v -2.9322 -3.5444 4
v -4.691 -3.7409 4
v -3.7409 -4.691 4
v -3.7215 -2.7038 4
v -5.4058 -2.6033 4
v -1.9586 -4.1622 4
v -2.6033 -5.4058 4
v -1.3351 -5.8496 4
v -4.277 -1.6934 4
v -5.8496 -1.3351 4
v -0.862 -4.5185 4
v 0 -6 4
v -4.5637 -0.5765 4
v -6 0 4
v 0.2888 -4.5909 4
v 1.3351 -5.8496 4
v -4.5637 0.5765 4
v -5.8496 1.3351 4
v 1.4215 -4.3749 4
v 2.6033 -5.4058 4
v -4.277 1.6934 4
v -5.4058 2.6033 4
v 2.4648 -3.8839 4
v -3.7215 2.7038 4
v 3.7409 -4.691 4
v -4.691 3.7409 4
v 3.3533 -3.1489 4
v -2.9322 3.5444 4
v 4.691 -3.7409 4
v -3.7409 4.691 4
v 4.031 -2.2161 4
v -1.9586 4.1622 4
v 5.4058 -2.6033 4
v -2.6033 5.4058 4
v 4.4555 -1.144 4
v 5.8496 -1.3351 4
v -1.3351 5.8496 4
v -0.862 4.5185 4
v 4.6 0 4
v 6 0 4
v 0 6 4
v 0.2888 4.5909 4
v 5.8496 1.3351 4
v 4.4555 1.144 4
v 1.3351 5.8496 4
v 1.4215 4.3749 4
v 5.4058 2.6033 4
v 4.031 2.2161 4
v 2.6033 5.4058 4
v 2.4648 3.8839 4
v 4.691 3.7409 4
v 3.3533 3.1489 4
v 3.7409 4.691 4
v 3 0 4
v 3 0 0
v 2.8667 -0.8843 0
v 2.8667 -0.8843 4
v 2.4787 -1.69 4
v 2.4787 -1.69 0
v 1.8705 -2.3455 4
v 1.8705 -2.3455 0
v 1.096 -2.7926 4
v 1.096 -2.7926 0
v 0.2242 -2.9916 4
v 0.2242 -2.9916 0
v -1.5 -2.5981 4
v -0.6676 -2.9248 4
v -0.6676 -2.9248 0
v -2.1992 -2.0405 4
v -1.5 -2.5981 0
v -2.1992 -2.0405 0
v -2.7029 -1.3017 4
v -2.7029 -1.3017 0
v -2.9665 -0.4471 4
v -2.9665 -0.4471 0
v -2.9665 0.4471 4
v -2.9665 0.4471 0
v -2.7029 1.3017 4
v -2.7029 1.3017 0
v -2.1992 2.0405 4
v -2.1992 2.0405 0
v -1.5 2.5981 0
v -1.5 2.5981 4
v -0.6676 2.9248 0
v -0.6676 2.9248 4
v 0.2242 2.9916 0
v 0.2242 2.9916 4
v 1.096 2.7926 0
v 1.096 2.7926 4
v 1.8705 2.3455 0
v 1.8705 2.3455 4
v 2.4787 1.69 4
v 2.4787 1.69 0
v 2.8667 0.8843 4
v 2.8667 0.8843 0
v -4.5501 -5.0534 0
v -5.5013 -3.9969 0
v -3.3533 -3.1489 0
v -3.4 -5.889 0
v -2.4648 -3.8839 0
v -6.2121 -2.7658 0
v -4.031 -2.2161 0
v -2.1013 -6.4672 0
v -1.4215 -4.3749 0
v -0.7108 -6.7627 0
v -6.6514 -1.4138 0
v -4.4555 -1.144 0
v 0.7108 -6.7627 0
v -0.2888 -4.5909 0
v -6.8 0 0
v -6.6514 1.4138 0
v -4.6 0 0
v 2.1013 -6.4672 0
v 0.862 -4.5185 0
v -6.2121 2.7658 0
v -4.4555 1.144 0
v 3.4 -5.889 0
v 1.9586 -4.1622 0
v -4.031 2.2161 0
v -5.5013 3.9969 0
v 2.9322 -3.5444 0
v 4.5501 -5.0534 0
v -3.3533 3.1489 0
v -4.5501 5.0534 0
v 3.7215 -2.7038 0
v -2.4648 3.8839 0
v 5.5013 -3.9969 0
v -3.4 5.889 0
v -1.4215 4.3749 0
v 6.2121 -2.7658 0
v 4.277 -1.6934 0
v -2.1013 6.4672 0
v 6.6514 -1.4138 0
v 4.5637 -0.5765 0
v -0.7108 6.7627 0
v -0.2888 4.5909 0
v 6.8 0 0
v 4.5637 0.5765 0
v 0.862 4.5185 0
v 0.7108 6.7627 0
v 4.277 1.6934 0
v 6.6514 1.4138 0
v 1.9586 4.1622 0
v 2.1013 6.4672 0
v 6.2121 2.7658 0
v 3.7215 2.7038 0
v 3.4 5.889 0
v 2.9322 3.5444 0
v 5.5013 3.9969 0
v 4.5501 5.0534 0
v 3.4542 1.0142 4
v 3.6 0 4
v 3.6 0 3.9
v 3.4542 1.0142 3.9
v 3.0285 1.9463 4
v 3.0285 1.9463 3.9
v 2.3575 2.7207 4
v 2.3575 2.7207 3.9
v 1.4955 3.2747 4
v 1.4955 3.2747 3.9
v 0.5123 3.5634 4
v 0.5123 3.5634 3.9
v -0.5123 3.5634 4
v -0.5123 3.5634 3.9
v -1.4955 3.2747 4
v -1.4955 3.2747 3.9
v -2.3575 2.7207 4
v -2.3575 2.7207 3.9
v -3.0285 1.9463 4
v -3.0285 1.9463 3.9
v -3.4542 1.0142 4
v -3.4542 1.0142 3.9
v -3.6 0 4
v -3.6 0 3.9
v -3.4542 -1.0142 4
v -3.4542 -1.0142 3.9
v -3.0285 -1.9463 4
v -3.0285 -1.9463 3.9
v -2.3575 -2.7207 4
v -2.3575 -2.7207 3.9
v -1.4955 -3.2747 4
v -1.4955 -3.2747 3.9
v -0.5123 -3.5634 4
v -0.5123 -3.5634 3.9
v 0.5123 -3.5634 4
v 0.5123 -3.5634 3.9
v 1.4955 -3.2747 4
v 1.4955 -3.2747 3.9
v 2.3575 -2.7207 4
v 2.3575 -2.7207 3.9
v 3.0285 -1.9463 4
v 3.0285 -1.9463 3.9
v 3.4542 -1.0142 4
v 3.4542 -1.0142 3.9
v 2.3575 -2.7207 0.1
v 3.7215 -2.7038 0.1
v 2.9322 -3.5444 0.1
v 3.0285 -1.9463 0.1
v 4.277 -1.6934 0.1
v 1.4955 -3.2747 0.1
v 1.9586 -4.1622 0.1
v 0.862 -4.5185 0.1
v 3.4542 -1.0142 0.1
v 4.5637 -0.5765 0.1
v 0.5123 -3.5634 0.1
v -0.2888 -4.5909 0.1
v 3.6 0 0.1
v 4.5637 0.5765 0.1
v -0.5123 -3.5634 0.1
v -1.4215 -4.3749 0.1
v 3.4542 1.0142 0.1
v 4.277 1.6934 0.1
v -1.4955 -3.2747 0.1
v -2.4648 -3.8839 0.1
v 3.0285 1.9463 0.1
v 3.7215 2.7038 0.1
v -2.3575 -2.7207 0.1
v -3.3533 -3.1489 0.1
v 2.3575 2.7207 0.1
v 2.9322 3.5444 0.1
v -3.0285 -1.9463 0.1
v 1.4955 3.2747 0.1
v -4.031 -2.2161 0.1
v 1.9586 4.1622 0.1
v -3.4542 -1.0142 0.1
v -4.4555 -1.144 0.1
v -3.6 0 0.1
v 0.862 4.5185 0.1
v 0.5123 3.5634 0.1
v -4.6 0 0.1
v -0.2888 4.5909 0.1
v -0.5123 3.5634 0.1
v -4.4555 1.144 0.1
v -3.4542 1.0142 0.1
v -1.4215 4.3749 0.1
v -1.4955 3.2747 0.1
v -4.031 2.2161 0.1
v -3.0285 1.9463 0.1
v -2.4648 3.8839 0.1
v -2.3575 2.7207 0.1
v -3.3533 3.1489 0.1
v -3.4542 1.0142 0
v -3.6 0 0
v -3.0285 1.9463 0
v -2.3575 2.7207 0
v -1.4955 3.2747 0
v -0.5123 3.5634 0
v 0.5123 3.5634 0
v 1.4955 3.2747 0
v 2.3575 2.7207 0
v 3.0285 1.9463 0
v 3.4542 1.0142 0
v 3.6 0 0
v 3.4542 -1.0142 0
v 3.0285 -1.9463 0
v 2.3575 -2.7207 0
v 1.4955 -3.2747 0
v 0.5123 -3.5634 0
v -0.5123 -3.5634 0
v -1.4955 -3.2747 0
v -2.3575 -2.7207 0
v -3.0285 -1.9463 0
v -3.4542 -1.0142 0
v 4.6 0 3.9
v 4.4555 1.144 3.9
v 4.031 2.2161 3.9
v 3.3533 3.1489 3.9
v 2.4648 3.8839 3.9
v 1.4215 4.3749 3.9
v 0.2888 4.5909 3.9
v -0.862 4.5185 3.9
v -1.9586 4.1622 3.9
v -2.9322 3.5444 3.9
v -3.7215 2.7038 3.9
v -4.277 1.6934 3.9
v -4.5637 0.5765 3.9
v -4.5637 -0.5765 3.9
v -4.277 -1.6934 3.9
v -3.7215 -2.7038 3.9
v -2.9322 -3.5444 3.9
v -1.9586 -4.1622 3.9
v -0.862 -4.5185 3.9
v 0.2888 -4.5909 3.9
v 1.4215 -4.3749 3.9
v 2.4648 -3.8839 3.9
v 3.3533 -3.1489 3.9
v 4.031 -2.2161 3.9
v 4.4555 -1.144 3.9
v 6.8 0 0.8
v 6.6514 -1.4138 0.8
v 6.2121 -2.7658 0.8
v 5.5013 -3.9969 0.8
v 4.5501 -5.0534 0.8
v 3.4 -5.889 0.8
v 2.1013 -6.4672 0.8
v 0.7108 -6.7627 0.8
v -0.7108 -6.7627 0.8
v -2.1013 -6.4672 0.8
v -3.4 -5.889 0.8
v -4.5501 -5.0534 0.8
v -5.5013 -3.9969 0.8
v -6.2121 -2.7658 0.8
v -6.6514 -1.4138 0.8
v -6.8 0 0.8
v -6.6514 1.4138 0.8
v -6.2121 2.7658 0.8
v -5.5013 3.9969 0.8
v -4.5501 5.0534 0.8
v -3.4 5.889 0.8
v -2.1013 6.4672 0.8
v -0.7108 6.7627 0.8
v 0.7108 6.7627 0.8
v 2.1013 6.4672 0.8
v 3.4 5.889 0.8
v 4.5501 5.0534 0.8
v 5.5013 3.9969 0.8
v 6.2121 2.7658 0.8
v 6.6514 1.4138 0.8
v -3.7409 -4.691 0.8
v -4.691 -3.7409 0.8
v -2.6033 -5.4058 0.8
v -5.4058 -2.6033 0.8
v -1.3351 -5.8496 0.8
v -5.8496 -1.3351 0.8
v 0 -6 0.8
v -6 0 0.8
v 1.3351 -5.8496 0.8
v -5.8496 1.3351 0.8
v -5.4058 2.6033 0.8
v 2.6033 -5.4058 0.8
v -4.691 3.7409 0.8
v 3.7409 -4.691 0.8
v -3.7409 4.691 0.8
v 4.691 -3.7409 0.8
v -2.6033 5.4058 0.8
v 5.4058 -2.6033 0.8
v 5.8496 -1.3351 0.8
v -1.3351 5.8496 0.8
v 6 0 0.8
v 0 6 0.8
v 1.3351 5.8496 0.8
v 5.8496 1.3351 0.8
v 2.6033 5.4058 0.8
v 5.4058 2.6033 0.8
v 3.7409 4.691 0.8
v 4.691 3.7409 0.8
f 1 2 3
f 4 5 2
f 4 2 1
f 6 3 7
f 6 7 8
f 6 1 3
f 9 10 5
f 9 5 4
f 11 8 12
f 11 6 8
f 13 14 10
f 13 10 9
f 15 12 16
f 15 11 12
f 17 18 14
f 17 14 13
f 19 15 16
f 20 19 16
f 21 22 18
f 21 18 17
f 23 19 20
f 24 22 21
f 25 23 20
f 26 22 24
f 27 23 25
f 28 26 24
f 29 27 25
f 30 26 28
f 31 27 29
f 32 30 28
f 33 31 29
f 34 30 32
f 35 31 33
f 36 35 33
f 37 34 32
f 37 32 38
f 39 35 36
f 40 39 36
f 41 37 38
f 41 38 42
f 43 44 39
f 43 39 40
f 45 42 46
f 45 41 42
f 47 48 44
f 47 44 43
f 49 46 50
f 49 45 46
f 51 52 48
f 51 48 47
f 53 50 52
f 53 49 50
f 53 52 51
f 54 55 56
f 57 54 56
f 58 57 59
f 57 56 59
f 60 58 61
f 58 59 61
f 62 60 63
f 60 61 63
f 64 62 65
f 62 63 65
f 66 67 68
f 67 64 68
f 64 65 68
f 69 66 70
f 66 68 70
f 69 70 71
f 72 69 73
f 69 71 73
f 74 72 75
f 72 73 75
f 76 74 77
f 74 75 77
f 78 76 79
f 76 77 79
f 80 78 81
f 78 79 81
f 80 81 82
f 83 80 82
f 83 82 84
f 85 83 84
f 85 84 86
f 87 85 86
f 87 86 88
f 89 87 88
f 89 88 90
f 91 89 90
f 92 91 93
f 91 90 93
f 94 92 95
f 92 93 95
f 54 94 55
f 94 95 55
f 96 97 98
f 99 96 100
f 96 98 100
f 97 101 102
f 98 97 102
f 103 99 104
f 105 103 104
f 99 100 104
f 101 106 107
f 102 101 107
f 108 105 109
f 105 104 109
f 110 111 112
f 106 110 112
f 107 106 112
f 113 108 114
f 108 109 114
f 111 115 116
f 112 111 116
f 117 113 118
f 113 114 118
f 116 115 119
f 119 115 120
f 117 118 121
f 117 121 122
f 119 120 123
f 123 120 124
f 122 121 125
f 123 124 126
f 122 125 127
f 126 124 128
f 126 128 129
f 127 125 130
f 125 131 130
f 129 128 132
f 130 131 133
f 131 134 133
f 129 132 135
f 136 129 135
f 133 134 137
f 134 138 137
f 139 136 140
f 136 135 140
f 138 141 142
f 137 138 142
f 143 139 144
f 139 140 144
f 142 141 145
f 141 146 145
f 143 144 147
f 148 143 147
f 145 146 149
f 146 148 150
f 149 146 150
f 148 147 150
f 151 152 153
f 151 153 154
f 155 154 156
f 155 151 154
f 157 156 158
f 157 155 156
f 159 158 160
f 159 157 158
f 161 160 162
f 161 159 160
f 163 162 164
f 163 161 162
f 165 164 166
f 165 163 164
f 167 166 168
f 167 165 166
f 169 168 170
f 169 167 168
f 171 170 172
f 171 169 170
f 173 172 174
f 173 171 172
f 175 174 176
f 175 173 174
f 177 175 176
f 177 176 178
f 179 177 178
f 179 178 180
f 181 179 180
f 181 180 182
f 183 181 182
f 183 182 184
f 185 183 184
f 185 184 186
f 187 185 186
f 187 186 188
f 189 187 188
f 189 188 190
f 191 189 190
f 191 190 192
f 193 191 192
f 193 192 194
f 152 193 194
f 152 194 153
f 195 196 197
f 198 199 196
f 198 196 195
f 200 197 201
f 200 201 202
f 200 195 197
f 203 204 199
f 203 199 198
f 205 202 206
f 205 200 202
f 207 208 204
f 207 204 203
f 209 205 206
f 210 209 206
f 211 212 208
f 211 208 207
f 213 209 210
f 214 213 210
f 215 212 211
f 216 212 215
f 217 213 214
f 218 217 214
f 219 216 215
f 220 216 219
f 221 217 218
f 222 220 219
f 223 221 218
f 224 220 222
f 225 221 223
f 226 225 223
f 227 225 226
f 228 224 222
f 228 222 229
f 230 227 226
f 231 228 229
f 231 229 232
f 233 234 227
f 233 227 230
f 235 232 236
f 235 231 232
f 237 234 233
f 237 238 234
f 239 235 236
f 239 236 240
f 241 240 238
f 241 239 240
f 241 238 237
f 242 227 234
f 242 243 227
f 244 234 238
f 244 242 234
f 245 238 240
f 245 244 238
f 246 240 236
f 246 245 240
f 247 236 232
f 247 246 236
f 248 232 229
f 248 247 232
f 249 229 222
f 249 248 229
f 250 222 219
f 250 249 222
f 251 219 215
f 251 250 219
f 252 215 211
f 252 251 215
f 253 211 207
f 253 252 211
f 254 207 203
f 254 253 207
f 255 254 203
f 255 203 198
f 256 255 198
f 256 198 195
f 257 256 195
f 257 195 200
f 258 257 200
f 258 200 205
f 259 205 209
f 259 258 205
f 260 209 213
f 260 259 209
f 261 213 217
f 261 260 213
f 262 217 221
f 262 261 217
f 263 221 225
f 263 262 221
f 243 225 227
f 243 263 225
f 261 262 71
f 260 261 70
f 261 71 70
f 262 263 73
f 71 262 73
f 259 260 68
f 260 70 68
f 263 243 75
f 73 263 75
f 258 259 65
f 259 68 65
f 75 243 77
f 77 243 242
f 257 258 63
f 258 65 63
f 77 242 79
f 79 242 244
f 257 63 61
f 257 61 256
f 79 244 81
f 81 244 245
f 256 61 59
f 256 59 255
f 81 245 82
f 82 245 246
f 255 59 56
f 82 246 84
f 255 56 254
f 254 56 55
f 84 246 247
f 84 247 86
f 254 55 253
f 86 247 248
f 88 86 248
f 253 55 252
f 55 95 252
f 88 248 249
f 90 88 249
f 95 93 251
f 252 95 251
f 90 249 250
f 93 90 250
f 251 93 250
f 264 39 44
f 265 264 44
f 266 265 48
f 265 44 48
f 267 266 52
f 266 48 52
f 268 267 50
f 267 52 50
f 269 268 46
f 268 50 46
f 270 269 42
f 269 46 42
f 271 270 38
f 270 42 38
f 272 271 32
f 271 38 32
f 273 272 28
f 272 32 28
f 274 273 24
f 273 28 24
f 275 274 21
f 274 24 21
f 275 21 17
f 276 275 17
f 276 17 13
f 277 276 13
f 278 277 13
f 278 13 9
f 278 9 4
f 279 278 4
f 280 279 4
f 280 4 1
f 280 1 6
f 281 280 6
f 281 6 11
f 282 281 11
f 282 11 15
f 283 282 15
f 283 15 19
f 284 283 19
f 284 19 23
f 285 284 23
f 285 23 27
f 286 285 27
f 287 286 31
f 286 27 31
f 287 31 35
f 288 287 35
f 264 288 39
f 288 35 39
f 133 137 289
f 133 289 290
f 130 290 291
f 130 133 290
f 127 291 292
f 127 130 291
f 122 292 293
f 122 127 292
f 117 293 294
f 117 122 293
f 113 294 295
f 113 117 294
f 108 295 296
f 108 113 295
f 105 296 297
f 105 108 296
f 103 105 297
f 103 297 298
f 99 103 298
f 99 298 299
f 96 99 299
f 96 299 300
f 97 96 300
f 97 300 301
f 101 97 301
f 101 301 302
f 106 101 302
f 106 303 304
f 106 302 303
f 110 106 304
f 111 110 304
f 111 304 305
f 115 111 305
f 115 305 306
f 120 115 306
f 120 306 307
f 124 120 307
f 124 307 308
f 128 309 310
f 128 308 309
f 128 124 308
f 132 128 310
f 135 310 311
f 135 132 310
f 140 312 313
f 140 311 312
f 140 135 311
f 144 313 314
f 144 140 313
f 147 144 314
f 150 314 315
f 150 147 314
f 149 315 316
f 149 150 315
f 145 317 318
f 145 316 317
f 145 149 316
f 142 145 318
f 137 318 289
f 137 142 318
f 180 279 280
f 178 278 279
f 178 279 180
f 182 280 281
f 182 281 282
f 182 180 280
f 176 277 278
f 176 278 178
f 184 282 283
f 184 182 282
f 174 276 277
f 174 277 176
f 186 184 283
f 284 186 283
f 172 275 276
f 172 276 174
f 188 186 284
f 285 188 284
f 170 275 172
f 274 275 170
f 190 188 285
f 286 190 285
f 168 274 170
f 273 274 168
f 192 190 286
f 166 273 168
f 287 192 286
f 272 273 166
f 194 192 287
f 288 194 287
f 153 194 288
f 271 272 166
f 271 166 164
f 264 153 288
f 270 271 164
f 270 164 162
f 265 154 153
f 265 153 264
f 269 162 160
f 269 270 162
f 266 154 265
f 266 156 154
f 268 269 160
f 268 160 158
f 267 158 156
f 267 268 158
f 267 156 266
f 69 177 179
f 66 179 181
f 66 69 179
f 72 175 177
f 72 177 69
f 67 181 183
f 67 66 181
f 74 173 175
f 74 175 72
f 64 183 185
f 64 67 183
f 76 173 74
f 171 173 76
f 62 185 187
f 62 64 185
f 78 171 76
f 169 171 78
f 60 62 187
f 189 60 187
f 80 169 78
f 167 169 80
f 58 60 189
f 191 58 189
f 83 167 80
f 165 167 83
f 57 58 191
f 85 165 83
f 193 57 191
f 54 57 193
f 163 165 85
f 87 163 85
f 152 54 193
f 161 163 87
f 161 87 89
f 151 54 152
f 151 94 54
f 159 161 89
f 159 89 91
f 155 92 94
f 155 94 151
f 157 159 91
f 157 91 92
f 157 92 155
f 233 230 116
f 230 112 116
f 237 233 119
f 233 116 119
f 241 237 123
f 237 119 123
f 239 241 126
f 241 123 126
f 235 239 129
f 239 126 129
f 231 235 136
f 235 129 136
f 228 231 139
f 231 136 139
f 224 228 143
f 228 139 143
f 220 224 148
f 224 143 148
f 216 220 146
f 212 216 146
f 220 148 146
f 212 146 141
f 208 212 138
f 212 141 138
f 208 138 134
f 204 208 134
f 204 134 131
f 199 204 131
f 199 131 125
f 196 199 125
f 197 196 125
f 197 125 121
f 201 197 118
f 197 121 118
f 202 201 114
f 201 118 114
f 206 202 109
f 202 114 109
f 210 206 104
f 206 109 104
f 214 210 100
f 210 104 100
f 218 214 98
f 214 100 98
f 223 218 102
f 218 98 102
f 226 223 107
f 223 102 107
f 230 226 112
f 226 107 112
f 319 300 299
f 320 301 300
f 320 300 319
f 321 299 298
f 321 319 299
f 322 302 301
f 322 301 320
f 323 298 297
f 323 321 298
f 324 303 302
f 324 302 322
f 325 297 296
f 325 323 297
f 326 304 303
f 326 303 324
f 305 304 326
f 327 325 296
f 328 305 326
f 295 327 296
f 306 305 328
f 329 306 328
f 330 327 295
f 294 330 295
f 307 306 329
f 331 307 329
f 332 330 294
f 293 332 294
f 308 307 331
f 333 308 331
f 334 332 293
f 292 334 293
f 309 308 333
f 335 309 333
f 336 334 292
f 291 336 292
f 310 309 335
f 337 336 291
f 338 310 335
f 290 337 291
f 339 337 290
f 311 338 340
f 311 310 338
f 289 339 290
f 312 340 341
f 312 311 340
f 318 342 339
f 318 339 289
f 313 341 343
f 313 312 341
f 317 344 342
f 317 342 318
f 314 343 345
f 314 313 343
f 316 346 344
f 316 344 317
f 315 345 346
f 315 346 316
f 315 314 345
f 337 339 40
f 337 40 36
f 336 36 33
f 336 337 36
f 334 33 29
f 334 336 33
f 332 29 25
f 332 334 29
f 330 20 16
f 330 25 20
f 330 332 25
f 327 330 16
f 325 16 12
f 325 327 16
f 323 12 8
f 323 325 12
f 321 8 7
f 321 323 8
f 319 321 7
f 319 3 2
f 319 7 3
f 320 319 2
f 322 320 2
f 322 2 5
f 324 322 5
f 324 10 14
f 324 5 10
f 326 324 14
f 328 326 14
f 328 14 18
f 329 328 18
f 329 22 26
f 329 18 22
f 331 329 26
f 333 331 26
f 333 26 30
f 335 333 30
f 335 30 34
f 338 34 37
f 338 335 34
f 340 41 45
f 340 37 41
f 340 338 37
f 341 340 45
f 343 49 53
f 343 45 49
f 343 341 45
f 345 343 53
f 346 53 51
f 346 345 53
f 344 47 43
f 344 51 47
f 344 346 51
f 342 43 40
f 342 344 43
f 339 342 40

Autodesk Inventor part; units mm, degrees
ref_plane "YZ Plane" through (0, 0, 0) normal (1, 0, 0) x (0, 1, 0)
ref_plane "XZ Plane" through (0, 0, 0) normal (0, 1, 0) x (-1, 0, 0)
ref_plane "XY Plane" through (0, 0, 0) normal (0, 0, 1) x (1, 0, 0)
sketch "スケッチ1" plane through (0, 0, 0) normal (0, 0, 1) x (1, 0, 0)
  circle A0 centre (0, 0) radius 3
  circle A1 centre (0, 0) radius 6
  circle A2 centre (0, 0) radius 6.8
  dimension "d0" = 6
  dimension "d1" = 12
  dimension "d2" = 0.8
extrude "押し出し1" add sketch "スケッチ1" along normal blind 4 contours A1
extrude "押し出し2" add sketch "スケッチ1" along normal blind 0.8 contours A2
sketch "スケッチ2" plane through (0, 0, 0) normal (0, 0, -1) x (-1, 0, 0)
  circle A0 centre (0, 0) radius 3.6
  circle A1 centre (0, 0) radius 4.6
  dimension "d7" = 7.2
  dimension "d8" = 9.2
extrude "押し出し3" cut sketch "スケッチ2" against normal blind 0.1
sketch "スケッチ3" plane through (0, 0, 4) normal (0, 0, 1) x (1, 0, 0)
  circle A0 centre (0, 0) radius 3.6
  circle A1 centre (0, 0) radius 4.6
  dimension "d11" = 7.2
  dimension "d12" = 9.2
extrude "押し出し4" cut sketch "スケッチ3" against normal blind 0.1
properties part number "ベアリングFd6D12B4" material "鋼、炭素鋼"
